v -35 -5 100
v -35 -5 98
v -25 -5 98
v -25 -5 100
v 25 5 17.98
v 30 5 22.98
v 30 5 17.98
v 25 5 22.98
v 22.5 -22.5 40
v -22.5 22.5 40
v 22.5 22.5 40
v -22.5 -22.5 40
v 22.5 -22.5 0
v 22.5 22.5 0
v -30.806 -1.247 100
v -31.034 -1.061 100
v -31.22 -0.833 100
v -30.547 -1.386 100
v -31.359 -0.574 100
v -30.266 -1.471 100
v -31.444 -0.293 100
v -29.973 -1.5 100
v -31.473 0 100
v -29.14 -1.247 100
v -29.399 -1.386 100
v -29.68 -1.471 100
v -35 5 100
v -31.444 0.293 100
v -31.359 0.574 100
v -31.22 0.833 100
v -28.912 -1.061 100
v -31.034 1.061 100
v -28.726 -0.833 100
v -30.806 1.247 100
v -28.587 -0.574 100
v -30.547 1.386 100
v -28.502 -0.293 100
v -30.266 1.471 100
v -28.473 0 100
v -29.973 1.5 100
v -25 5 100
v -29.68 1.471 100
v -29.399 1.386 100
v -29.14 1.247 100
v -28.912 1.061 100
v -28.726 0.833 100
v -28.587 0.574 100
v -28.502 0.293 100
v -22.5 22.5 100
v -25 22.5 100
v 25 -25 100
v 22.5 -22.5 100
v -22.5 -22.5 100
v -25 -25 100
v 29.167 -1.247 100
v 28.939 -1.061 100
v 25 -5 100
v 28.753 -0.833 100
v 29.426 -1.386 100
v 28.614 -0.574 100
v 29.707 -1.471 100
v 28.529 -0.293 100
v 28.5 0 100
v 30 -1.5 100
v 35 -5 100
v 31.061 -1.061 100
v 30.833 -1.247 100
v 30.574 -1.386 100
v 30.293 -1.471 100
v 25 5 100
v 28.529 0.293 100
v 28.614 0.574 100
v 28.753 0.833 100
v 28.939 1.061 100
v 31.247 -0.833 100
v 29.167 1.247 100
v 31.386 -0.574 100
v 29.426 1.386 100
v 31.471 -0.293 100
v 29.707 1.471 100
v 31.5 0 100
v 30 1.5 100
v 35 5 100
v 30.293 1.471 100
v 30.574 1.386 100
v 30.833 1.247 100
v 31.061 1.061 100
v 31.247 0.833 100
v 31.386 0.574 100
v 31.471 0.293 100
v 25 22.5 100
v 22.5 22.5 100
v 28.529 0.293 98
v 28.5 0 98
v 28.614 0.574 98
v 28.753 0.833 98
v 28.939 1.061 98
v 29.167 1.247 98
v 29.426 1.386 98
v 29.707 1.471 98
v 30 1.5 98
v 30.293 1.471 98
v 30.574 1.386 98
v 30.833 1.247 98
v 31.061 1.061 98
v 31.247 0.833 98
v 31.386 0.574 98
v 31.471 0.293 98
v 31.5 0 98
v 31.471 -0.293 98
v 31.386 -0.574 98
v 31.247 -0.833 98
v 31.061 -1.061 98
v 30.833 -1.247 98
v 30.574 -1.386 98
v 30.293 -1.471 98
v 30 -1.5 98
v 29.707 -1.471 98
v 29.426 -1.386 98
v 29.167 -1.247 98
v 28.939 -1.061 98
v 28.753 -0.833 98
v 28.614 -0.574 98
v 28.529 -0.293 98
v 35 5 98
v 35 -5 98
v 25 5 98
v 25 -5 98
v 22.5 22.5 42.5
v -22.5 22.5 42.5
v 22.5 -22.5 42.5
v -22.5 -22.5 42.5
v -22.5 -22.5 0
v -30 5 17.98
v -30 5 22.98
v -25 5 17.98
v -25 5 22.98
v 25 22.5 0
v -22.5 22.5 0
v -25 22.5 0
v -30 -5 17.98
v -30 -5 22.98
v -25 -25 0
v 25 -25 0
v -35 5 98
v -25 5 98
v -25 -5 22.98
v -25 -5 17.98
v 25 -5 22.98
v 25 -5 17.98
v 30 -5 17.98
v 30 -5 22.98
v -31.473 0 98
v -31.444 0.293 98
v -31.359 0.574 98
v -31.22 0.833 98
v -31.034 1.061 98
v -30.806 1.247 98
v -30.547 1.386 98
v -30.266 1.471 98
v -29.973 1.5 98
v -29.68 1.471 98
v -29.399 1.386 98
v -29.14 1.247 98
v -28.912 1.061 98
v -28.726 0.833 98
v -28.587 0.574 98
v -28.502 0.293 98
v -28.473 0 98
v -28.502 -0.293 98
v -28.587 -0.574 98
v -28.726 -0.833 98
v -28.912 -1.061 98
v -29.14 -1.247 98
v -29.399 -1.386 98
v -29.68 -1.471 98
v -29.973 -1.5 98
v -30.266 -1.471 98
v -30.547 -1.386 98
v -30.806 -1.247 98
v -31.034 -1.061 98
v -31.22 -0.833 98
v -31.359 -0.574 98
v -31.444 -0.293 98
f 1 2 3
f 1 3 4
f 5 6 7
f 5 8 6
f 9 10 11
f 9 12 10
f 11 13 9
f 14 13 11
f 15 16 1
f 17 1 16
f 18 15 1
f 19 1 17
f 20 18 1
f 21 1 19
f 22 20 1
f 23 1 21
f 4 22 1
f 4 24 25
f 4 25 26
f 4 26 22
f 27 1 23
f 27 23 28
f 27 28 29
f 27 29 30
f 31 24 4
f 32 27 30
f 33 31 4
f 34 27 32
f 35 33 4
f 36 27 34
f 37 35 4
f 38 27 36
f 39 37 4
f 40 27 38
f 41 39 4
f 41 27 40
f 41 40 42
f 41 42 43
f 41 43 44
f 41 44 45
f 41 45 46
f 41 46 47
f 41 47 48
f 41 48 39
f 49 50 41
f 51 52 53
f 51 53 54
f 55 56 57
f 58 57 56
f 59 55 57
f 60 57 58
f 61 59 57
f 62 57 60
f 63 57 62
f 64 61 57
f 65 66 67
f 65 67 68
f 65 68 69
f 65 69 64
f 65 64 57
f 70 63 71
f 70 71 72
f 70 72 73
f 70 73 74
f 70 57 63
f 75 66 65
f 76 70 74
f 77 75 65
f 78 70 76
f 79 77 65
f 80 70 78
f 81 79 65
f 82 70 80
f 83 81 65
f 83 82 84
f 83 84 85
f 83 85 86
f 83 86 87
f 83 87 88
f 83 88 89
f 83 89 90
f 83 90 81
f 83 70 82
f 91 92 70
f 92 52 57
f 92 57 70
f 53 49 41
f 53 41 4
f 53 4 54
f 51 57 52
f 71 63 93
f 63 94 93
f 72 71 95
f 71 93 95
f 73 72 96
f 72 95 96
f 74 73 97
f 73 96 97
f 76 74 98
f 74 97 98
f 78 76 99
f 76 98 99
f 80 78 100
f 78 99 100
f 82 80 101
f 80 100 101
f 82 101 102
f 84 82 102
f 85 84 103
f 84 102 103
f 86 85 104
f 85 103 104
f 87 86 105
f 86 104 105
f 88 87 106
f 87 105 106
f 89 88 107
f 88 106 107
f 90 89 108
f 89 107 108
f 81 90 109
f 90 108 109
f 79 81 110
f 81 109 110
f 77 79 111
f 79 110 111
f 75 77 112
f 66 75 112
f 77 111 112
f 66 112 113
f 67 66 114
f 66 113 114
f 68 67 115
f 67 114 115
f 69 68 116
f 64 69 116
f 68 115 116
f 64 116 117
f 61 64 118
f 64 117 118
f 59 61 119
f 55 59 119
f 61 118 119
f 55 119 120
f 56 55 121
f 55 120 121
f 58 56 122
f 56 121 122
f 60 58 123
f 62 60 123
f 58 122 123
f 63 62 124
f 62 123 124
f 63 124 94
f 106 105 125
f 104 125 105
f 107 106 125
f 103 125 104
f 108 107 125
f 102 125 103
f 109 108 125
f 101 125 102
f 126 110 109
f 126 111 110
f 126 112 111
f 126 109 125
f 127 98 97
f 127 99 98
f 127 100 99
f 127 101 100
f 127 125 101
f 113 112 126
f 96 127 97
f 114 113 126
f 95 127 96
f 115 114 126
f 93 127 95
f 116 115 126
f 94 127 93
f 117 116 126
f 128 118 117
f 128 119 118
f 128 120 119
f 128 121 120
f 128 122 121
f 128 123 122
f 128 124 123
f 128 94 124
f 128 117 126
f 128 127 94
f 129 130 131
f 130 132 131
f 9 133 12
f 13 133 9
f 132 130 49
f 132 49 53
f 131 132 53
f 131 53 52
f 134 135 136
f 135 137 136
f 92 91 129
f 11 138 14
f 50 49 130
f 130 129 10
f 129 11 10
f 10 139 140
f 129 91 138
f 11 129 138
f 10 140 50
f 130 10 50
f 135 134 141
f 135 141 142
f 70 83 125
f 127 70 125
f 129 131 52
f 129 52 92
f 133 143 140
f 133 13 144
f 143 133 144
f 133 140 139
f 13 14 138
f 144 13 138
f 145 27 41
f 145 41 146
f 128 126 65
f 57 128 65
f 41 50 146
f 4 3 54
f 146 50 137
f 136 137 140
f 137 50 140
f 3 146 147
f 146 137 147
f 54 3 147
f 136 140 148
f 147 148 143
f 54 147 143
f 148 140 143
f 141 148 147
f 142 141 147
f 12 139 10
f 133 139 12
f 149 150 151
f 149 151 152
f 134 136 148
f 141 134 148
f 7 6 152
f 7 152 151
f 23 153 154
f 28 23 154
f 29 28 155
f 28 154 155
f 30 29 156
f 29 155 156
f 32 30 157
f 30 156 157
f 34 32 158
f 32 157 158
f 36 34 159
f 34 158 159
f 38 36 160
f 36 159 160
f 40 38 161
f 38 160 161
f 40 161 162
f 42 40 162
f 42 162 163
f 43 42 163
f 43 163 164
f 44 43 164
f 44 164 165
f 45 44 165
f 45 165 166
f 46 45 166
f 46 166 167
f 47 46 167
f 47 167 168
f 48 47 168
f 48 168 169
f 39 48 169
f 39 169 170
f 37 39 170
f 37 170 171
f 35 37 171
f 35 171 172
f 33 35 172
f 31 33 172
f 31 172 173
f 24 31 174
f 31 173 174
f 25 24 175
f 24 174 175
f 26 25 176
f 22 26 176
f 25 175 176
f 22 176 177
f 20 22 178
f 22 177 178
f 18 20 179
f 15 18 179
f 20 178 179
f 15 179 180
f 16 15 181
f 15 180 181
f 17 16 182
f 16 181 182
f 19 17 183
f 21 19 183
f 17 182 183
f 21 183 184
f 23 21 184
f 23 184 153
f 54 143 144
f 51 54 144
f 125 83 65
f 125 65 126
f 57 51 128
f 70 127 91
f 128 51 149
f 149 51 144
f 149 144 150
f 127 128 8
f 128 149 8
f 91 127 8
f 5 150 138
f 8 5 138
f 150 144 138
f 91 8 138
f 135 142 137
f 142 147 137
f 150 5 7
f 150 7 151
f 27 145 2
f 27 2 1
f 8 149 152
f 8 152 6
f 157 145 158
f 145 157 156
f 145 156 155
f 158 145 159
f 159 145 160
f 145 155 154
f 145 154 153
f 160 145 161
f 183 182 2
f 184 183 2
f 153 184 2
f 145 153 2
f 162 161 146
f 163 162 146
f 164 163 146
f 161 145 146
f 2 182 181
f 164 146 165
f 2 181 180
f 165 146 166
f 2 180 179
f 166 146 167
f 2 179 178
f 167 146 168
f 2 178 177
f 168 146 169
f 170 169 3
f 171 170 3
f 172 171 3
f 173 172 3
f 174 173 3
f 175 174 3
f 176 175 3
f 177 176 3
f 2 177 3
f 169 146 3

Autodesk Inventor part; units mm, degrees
ref_plane "YZ Plane" through (0, 0, 0) normal (1, 0, 0) x (0, 1, 0)
ref_plane "XZ Plane" through (0, 0, 0) normal (0, 1, 0) x (-1, 0, 0)
ref_plane "XY Plane" through (0, 0, 0) normal (0, 0, 1) x (1, 0, 0)
sketch "Boceto1" plane through (0, 0, 0) normal (0, 0, 1) x (1, 0, 0)
  line L0 (-22.5, 22.5) -> (-22.5, -22.5)
  line L1 (-22.5, -22.5) -> (22.5, -22.5)
  line L2 (22.5, -22.5) -> (22.5, 22.5)
  line L3 (-25, 22.5) -> (-25, -25)
  line L4 (-25, -25) -> (25, -25)
  line L5 (25, -25) -> (25, 22.5)
  line L6 (22.5, 22.5) -> (25, 22.5)
  line L7 (-22.5, 22.5) -> (-25, 22.5)
extrude "Extrusión1" add sketch "Boceto1" along normal blind 100
sketch "Boceto2" plane through (-22.5, -22.5, 0) normal (0, 1, 0) x (1, 0, 0)
  line L0 (-2.5, -100) -> (47.5, -100) projected
  line L1 (22.5, -40) -> (45, -40)
  line L2 (45, 0) -> (45, -100) projected
  line L3 (0, 0) -> (0, -100) projected
  line L4 (0, -40) -> (22.5, -40)
  line L5 (22.5, -42.5) -> (45, -42.5)
  line L6 (22.5, -42.5) -> (0, -42.5)
  line L7 (45, -40) -> (45, -42.5)
  line L8 (0, -40) -> (0, -42.5)
  point P0 (22.5, 0)
  dimension "d10" = 2.5
extrude "Extrusión2" add sketch "Boceto2" along normal blind 45 contours L3 L4 L1 L2 L5 L6
sketch "Boceto3" plane through (25, -25, 0) normal (1, 0, 0) x (0, 0, -1)
  line L0 (-100, 2.5) -> (-100, 47.5) projected
  line L1 (-100, 25) -> (-100, 20)
  line L2 (-100, 25) -> (-100, 30)
  line L3 (-100, 30) -> (-98, 30)
  line L4 (-98, 30) -> (-98, 20)
  line L5 (-98, 20) -> (-100, 20)
  point P0 (0, 25)
  dimension "d13" = 5
  dimension "d14" = 5
  dimension "d15" = 2
sketch "Boceto4" plane through (-25, -25, 0) normal (-1, 0, 0) x (0, 0, 1)
  line L0 (100, 2.5) -> (100, 47.5) projected
  line L1 (100, 25) -> (100, 20)
  line L2 (100, 25) -> (100, 30)
  line L3 (100, 30) -> (98, 30)
  line L4 (98, 30) -> (98, 20)
  line L5 (98, 20) -> (100, 20)
  point P0 (0, 25)
  dimension "d16" = 5
  dimension "d17" = 5
  dimension "d18" = 2
extrude "Extrusión3" add sketch "Boceto4" along normal blind 10
extrude "Extrusión4" add sketch "Boceto3" along normal blind 10
sketch "Boceto5" plane through (25, -5, 98) normal (0, 0, -1) x (-1, 0, 0)
  line L0 (0, 0) -> (-10, 0) projected
  line L1 (0, 10) -> (0, 27.5) projected
  line L2 (0, 10) -> (-10, 10)
  line L3 (50, 0) -> (50, -20) projected
  line L4 (50, 0) -> (59.9457, 0)
  line L5 (50, 27.5) -> (50, 10) projected
  circle A0 centre (-5, 5) radius 1.5
  circle A1 centre (54.9729, 5) radius 1.5
  point P0 (25, 5)
  dimension "d23" = 3
  dimension "d24" = 3
extrude "Extrusión5" cut sketch "Boceto5" against normal through all
sketch "Boceto7" plane through (25, -25, 0) normal (1, 0, 0) x (0, 0, -1)
  line L0 (-17.98, 25) -> (-17.98, 30)
  line L1 (-17.98, 30) -> (-17.98, 25)
  line L2 (-17.98, 25) -> (-17.98, 20)
  line L3 (-17.98, 20) -> (-22.98, 20)
  line L4 (-22.98, 20) -> (-22.98, 30)
  line L5 (-22.98, 30) -> (-17.98, 30)
  point P0 (0, 25)
  dimension "d27" = 17.98
  dimension "d28" = 5
  dimension "d29" = 5
  dimension "d30" = 5
sketch "Boceto8" plane through (-25, -25, 0) normal (-1, 0, 0) x (0, 0, 1)
  line L0 (0, 25) -> (17.98, 25)
  line L1 (17.98, 25) -> (17.98, 20)
  line L2 (17.98, 20) -> (22.98, 20)
  line L3 (22.98, 20) -> (22.98, 30)
  line L4 (22.98, 30) -> (17.98, 30)
  line L5 (17.98, 30) -> (17.98, 25)
  dimension "d31" = 17.98
  dimension "d32" = 5
  dimension "d33" = 5
  dimension "d34" = 10
  dimension "d35" = 5
  dimension "d36" = 5
extrude "Extrusión6" add sketch "Boceto8" along normal blind 5
extrude "Extrusión7" add sketch "Boceto7" along normal blind 5
properties part number "Torre Motor" material "Plástico ABS"
